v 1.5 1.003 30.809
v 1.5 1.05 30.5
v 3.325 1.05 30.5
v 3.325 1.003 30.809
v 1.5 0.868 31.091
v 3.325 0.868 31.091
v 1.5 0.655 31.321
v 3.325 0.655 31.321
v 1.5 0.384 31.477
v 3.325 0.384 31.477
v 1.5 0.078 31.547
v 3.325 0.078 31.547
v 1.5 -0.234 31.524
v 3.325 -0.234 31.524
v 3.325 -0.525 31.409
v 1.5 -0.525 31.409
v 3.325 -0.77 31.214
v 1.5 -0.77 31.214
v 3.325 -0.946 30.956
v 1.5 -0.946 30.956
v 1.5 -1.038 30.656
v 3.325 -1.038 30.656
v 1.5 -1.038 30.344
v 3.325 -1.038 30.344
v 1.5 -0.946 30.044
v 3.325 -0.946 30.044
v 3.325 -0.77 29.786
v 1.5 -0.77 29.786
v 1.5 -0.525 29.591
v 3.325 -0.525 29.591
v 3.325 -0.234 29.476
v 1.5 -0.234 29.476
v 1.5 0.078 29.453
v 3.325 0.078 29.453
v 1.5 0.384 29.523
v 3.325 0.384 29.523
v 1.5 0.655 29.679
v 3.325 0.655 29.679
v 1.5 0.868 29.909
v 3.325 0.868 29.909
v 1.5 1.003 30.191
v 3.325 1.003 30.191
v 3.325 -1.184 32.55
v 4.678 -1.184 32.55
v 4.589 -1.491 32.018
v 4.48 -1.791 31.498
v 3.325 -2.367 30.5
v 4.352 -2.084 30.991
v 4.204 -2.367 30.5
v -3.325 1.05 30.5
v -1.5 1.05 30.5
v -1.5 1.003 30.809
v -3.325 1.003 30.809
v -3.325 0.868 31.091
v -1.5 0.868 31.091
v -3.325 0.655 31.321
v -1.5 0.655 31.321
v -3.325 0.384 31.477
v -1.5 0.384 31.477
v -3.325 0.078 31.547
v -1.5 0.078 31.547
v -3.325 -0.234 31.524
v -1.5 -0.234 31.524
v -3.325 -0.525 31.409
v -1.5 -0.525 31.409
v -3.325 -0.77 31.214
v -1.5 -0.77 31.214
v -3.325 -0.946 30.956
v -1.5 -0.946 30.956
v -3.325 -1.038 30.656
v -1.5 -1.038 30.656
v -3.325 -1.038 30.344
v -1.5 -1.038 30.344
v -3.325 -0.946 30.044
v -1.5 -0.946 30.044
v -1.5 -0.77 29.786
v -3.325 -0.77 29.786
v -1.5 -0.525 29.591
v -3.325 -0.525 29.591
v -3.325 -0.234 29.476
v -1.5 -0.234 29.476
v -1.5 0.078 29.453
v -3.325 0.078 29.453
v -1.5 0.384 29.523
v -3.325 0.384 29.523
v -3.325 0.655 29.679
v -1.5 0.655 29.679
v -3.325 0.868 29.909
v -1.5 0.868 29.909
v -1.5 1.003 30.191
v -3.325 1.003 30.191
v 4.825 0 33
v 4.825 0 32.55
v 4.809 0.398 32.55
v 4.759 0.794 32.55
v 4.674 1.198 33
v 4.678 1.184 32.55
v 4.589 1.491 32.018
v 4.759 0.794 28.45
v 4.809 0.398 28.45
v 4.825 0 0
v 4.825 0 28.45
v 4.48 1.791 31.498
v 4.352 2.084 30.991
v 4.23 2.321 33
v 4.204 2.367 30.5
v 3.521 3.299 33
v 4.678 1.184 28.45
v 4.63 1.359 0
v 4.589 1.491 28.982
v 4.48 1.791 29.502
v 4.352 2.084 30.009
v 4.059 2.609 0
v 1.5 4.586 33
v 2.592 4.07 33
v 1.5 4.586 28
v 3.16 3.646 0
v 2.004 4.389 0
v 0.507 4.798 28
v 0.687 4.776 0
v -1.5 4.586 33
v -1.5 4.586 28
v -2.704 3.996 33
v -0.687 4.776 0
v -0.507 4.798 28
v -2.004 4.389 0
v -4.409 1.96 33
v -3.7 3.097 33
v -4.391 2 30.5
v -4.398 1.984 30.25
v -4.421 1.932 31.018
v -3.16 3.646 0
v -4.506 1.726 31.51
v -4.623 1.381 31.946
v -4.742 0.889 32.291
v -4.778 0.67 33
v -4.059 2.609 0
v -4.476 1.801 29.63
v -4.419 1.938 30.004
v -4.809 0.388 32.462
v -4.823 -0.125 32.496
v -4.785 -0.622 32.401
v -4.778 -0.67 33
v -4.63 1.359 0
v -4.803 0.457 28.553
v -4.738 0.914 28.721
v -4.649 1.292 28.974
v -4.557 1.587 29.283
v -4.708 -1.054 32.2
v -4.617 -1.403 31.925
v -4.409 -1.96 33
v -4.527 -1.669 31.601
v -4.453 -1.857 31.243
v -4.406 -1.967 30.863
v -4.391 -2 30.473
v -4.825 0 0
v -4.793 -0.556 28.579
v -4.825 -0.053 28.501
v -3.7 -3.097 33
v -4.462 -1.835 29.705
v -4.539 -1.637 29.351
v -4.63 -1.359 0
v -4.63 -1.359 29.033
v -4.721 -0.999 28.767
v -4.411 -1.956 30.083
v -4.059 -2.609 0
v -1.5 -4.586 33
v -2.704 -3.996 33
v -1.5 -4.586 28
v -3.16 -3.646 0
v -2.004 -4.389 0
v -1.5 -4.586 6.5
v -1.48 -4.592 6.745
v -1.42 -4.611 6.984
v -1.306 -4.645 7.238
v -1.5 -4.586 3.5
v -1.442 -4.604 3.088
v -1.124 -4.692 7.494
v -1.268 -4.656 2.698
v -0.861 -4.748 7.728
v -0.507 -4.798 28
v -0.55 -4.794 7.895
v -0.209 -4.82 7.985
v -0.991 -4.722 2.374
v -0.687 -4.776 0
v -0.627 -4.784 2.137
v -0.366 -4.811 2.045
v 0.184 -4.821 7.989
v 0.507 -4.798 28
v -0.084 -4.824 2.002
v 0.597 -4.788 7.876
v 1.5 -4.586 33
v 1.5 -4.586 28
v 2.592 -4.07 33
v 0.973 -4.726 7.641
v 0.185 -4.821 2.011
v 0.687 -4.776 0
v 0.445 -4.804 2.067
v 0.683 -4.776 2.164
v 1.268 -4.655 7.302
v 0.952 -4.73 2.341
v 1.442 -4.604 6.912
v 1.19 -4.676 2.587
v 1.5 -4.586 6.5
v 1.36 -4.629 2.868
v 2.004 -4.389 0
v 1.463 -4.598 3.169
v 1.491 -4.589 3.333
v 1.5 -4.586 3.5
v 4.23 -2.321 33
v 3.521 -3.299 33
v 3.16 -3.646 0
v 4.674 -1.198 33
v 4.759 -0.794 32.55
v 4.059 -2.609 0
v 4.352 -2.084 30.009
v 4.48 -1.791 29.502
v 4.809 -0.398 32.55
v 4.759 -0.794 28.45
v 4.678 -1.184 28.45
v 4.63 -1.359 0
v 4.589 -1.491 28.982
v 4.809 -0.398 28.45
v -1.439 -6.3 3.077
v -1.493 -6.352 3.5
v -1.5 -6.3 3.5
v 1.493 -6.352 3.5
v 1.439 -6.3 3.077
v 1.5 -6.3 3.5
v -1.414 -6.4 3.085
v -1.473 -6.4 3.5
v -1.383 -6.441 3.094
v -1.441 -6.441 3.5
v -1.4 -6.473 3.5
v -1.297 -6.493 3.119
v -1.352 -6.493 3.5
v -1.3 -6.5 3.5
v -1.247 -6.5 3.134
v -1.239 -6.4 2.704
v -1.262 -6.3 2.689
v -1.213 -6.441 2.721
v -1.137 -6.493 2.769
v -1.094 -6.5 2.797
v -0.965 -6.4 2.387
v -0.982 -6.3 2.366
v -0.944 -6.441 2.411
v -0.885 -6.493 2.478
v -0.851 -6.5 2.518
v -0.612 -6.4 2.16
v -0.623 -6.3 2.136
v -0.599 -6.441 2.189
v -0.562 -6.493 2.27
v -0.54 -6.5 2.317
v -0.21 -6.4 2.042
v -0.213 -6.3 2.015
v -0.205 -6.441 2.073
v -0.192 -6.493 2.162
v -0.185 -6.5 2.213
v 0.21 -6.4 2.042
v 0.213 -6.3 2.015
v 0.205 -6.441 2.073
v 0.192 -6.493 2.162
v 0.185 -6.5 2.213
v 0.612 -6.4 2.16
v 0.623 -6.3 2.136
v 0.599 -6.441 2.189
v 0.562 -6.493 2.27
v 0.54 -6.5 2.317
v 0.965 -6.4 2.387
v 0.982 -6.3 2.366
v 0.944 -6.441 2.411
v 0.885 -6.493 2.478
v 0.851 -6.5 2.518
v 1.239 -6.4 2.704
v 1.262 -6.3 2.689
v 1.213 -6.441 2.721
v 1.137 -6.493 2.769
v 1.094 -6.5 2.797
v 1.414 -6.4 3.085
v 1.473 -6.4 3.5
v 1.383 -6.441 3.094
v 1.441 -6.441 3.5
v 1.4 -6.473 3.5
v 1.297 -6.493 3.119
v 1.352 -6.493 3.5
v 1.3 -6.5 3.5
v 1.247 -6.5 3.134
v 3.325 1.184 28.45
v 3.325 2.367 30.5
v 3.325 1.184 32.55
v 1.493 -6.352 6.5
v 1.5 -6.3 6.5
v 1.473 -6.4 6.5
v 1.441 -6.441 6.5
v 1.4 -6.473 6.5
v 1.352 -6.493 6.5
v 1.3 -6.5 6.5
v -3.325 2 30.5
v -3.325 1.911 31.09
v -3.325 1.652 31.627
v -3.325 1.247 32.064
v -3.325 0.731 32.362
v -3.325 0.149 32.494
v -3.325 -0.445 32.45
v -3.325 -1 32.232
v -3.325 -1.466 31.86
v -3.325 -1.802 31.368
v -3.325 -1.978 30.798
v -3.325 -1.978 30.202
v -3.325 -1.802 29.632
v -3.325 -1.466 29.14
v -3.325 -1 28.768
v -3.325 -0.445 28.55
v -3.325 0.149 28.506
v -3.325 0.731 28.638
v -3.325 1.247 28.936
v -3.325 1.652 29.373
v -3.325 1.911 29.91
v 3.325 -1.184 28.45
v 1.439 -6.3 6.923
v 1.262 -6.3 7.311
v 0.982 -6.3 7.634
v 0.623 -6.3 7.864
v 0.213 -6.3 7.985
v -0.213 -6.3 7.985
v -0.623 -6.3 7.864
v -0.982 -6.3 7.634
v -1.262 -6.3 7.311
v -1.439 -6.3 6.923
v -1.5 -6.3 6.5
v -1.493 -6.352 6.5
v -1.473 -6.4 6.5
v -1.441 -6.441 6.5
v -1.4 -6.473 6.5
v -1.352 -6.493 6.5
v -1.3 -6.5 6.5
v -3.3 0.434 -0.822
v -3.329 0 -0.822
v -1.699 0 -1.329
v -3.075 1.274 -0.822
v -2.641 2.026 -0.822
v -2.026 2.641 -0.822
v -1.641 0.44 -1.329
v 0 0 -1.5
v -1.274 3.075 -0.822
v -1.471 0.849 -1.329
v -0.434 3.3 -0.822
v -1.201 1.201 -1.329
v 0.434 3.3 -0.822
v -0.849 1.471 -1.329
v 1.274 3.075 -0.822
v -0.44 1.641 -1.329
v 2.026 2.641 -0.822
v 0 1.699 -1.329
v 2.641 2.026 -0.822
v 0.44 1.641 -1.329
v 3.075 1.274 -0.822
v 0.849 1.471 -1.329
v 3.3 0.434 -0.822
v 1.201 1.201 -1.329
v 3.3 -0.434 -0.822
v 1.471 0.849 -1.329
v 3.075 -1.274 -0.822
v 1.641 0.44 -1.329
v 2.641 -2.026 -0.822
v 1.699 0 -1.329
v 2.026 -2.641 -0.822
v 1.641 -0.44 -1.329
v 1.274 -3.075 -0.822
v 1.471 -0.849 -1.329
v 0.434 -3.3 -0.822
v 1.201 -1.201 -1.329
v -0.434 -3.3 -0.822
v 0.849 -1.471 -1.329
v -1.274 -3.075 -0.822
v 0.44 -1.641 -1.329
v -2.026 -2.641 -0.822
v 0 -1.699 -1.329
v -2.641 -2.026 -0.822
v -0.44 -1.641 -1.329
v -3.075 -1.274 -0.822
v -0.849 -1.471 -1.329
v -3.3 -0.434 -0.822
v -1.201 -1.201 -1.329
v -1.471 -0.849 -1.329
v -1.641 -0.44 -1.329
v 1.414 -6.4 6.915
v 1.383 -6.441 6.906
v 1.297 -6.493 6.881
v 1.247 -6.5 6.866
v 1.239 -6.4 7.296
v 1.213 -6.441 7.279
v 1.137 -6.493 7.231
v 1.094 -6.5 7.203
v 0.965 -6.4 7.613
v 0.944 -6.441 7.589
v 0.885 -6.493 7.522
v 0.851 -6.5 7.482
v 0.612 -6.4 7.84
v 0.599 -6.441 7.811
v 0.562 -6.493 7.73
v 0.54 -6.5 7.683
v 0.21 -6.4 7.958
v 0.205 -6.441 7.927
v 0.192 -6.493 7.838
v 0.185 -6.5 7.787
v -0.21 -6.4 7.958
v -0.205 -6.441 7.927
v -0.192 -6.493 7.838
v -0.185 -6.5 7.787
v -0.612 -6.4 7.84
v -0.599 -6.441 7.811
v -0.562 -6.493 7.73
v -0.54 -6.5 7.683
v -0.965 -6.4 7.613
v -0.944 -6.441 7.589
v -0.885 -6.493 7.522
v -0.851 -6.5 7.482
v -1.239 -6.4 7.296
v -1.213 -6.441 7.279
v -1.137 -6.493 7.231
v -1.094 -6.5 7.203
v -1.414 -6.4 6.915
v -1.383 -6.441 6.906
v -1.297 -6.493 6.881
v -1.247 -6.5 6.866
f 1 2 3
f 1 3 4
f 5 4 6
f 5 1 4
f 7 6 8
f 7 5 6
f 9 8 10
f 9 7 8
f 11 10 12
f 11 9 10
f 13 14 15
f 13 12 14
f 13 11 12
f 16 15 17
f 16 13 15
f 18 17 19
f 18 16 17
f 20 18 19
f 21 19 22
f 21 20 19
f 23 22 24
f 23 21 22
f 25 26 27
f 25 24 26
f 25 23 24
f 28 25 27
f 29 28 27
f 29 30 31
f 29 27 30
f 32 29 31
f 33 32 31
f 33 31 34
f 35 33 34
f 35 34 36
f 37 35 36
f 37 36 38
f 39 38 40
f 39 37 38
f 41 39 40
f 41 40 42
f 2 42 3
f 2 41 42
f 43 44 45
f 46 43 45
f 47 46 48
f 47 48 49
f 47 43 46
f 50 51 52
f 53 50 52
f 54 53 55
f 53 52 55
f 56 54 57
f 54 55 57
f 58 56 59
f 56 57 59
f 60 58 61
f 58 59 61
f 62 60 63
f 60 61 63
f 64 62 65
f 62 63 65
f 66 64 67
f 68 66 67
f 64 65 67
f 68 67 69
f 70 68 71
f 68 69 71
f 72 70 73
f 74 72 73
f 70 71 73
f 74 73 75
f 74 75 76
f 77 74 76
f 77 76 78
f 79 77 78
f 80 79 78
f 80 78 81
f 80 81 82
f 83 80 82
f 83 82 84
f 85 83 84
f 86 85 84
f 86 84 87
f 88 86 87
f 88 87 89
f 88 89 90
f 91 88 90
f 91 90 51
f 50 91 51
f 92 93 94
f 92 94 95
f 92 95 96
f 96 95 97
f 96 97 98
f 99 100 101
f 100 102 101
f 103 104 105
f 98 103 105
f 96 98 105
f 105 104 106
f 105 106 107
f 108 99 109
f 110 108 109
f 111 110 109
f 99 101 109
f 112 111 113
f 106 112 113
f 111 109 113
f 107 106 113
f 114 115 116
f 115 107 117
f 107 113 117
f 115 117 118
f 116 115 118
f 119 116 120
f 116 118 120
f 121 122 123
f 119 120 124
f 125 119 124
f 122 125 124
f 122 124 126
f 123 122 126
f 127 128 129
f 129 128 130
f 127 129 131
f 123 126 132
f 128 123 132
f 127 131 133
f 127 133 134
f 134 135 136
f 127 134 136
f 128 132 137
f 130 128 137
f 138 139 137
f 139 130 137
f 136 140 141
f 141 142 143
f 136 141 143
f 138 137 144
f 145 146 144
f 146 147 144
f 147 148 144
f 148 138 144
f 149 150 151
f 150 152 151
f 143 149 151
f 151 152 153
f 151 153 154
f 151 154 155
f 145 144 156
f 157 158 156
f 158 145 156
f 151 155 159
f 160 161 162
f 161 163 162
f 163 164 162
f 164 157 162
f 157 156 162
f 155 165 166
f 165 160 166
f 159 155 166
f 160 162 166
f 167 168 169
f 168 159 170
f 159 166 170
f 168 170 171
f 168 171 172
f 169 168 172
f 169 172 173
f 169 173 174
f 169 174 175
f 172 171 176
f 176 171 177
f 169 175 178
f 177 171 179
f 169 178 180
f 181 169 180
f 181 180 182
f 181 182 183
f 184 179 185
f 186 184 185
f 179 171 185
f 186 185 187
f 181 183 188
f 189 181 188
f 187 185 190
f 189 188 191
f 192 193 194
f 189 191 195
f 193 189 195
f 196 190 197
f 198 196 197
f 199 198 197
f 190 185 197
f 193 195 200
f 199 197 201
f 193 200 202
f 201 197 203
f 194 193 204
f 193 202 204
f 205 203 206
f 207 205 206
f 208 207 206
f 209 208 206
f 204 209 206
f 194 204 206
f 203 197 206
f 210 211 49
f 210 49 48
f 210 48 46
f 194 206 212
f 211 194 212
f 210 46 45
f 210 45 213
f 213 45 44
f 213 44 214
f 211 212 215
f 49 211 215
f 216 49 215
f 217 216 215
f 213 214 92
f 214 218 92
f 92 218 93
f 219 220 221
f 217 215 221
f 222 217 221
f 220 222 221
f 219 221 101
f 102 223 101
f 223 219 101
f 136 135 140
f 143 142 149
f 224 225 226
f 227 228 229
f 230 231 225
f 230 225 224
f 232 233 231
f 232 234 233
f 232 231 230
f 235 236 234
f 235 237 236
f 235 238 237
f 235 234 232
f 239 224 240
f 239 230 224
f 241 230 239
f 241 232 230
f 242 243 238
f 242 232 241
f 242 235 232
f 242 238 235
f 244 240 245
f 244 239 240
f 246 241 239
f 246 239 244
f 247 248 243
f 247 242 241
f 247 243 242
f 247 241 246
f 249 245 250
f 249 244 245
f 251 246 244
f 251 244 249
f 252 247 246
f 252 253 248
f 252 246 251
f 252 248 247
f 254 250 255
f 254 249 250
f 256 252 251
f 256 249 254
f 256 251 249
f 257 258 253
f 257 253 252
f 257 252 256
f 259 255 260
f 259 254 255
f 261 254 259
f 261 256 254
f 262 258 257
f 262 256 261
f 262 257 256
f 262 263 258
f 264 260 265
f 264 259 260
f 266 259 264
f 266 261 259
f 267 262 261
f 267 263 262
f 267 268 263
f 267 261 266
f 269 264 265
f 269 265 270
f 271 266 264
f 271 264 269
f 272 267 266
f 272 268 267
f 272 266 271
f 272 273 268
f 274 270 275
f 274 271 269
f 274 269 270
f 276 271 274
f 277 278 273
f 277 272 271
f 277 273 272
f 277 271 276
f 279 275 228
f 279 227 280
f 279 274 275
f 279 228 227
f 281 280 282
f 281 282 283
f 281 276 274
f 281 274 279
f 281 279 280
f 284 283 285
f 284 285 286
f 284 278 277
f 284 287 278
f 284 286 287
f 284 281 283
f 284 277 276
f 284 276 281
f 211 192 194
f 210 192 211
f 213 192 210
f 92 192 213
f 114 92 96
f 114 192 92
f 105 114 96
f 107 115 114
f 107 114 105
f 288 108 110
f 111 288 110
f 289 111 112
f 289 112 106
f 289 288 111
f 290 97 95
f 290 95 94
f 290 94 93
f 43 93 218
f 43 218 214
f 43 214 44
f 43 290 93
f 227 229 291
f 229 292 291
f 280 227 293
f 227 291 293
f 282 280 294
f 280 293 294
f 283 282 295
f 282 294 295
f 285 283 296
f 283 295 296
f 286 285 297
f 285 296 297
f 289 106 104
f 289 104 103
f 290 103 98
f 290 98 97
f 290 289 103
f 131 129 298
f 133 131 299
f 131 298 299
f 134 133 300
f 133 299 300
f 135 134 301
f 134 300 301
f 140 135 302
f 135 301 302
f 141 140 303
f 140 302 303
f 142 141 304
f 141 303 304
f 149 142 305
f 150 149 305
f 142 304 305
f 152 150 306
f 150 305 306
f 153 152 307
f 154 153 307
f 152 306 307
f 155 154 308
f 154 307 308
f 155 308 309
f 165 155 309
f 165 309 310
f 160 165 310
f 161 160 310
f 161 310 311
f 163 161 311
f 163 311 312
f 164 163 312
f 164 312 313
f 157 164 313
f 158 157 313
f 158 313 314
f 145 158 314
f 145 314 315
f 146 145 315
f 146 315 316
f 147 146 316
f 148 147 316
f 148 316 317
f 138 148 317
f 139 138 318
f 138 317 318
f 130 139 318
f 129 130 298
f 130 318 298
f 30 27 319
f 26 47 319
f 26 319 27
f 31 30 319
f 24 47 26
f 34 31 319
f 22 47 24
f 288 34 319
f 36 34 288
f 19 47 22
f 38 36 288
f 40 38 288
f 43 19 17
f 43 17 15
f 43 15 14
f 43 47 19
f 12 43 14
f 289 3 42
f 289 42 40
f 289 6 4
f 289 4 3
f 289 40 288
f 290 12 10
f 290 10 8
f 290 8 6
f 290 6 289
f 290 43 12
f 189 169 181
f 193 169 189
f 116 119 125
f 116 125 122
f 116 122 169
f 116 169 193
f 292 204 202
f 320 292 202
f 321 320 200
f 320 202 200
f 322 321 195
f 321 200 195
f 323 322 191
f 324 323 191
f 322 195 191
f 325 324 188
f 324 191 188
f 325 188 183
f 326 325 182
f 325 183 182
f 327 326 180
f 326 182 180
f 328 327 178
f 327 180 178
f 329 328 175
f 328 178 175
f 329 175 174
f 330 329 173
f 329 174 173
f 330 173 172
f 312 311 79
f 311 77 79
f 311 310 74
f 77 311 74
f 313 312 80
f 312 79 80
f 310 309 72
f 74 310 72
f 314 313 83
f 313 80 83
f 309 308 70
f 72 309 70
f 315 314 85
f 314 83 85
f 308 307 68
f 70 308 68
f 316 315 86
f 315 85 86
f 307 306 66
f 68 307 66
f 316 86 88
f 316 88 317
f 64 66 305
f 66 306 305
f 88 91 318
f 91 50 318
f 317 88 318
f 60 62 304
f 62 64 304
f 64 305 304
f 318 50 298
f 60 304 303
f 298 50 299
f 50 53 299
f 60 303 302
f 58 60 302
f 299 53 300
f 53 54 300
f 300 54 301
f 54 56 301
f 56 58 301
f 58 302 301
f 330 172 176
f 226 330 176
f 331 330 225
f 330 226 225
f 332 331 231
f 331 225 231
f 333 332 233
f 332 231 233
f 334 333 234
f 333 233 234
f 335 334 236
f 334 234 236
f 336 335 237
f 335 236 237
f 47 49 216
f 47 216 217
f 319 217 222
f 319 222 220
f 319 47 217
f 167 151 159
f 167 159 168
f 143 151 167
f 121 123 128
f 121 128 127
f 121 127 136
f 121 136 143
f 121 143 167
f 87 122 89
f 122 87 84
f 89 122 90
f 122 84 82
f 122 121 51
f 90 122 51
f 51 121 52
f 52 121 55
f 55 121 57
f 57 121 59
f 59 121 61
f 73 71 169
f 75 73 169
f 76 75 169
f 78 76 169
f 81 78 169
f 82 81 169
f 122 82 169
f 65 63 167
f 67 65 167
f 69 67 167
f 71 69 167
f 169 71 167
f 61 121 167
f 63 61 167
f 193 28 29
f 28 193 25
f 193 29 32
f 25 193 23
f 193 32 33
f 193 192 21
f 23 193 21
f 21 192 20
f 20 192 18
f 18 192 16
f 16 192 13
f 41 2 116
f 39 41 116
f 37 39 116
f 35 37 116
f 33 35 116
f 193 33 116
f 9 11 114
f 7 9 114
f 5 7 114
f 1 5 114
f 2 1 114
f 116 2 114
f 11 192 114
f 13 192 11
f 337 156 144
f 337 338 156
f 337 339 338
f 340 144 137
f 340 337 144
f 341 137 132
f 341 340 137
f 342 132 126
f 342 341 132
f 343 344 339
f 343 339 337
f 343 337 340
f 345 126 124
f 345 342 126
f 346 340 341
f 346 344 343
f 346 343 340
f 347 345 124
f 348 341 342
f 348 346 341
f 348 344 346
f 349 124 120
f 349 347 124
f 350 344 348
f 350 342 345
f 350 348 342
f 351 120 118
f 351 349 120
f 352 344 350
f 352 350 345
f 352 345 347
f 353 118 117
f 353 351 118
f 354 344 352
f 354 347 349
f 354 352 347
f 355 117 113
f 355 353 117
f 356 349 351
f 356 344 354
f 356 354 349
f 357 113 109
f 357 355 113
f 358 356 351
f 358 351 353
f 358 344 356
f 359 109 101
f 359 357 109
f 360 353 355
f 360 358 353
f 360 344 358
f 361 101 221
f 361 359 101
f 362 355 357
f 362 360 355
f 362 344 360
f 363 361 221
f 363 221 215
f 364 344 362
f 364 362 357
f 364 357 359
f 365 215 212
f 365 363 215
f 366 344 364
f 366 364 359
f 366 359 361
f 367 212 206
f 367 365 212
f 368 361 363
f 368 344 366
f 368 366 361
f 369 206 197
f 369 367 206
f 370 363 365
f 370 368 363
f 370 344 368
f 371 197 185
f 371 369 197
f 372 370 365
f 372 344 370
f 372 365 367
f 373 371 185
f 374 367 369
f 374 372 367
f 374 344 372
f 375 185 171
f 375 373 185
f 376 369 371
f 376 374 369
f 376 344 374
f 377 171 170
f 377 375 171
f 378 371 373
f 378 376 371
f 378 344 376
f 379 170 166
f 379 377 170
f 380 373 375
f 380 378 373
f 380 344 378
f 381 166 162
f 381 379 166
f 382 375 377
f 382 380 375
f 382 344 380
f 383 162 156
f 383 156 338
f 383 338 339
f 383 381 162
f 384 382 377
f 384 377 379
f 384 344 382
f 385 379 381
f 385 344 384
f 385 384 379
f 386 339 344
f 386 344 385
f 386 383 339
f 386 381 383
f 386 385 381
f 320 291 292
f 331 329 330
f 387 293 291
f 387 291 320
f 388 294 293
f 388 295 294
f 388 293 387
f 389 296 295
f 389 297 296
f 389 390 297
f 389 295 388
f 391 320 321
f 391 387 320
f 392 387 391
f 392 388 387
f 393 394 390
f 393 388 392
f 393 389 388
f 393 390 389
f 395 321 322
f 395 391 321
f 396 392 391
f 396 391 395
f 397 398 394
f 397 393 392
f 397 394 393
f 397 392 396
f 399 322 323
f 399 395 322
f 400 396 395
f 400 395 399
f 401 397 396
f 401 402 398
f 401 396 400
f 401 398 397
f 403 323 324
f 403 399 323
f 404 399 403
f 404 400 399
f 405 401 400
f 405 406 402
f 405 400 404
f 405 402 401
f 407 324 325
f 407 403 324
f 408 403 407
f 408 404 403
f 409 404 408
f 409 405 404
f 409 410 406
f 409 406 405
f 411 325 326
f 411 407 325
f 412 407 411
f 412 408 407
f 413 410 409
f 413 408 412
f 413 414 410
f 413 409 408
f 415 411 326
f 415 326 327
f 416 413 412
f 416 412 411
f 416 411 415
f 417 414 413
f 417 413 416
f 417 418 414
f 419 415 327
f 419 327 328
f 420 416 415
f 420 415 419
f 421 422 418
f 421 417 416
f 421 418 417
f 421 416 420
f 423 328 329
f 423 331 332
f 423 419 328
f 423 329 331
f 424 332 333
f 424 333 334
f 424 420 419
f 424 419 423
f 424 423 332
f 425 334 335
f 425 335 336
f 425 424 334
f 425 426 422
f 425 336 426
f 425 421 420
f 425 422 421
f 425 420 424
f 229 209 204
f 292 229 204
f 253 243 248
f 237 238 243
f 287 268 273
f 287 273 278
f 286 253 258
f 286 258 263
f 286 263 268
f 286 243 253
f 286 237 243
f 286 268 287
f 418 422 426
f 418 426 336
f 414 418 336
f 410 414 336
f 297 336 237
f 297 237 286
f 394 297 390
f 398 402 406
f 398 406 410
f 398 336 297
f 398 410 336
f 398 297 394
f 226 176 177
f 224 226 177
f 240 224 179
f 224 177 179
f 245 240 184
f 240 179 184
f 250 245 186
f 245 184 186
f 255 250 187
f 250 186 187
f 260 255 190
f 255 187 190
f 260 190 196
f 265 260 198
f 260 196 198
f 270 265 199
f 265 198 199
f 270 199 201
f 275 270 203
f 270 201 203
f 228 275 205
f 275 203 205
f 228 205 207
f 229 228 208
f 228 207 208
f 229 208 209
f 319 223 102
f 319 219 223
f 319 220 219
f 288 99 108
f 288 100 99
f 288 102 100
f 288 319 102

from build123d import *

# Parameters (mm, degrees)
F0_R           = 4.825
F1_DEPTH       = 33
F3_DEPTH       = 6.5
F4_R           = 0.2
F8_DEPTH       = 5
F9_R           = 1.05
F10_DEPTH      = 4.8260001
F10_DEPTH_BACK = 4.8260001
F12_START      = 3.325
F12_DEPTH      = 1.5010001
F14_START      = -3.325
F13_R          = 2
F14_DEPTH      = 1.5010001118


with BuildPart() as f1:
    # F0 (on Top) → F1 (new body)
    with BuildSketch(Plane.XY):
        Circle(F0_R)
    extrude(amount=F1_DEPTH)

    # F2 (on Front) → F3 (join)
    with BuildSketch(Plane.XZ):
        with BuildLine():
            ThreePointArc((-1.5, 3.5), (0, 2), (1.5, 3.5))
            Line((1.5, 3.5), (1.5, 6.5))
            ThreePointArc((1.5, 6.5), (0, 8), (-1.5, 6.5))
            Line((-1.5, 6.5), (-1.5, 3.5))
        make_face()
    extrude(amount=F3_DEPTH)

    # F4
    f4_edges = [f1.edges().sort_by_distance(p)[0] for p in [
        (0, -6.5, 2),
        (1.5, -6.5, 5),
        (0, -6.5, 8),
        (-1.5, -6.5, 5),
    ]]
    fillet(f4_edges, radius=F4_R)

    # F5 (on Front) → F6 (revolve)
    with BuildSketch(Plane.XZ):
        with BuildLine():
            Line((0, 0), (-4.825, 0))
            ThreePointArc((-4.825, 0), (-2.5263919431, -1.1163524169), (0, -1.5))
            Line((0, -1.5), (0, 0))
        make_face()
    revolve(axis=Axis((0, 0, -1.4078605181), (0, 0, -1)))

    # F7 (on face) → F8 (cut)
    with BuildSketch(Plane.XY.offset(33)):
        with BuildLine():
            ThreePointArc((1.5, 4.585915939), (0, 4.825), (-1.5, 4.585915939))
            Line((-1.5, 4.585915939), (-1.5, -4.585915939))
            ThreePointArc((-1.5, -4.585915939), (0, -4.825), (1.5, -4.585915939))
            Line((1.5, -4.585915939), (1.5, 4.585915939))
        make_face()
    extrude(amount=-F8_DEPTH, mode=Mode.SUBTRACT)

    # F9 (on Right) → F10 (cut, two sides)
    with BuildSketch(Plane.YZ) as f10_sk:
        with Locations((0, 30.5)):
            Circle(F9_R)
    extrude(amount=F10_DEPTH, mode=Mode.SUBTRACT)
    extrude(f10_sk.sketch, amount=-F10_DEPTH_BACK, mode=Mode.SUBTRACT)

    # F11 (on Right) → F12 (cut)
    with BuildSketch(Plane.YZ.offset(F12_START)):
        Polygon((1.1835680518, 28.45), (2.3671361037, 30.5), (1.1835680518, 32.55), (-1.1835680518, 32.55), (-2.3671361037, 30.5), (-1.1835680518, 28.45), align=None)
    extrude(amount=F12_DEPTH, mode=Mode.SUBTRACT)

    # F13 (on Right) → F14 (cut)
    with BuildSketch(Plane.YZ.offset(F14_START)):
        with Locations((0, 30.5)):
            Circle(F13_R)
    extrude(amount=-F14_DEPTH, mode=Mode.SUBTRACT)


solid = f1.part
